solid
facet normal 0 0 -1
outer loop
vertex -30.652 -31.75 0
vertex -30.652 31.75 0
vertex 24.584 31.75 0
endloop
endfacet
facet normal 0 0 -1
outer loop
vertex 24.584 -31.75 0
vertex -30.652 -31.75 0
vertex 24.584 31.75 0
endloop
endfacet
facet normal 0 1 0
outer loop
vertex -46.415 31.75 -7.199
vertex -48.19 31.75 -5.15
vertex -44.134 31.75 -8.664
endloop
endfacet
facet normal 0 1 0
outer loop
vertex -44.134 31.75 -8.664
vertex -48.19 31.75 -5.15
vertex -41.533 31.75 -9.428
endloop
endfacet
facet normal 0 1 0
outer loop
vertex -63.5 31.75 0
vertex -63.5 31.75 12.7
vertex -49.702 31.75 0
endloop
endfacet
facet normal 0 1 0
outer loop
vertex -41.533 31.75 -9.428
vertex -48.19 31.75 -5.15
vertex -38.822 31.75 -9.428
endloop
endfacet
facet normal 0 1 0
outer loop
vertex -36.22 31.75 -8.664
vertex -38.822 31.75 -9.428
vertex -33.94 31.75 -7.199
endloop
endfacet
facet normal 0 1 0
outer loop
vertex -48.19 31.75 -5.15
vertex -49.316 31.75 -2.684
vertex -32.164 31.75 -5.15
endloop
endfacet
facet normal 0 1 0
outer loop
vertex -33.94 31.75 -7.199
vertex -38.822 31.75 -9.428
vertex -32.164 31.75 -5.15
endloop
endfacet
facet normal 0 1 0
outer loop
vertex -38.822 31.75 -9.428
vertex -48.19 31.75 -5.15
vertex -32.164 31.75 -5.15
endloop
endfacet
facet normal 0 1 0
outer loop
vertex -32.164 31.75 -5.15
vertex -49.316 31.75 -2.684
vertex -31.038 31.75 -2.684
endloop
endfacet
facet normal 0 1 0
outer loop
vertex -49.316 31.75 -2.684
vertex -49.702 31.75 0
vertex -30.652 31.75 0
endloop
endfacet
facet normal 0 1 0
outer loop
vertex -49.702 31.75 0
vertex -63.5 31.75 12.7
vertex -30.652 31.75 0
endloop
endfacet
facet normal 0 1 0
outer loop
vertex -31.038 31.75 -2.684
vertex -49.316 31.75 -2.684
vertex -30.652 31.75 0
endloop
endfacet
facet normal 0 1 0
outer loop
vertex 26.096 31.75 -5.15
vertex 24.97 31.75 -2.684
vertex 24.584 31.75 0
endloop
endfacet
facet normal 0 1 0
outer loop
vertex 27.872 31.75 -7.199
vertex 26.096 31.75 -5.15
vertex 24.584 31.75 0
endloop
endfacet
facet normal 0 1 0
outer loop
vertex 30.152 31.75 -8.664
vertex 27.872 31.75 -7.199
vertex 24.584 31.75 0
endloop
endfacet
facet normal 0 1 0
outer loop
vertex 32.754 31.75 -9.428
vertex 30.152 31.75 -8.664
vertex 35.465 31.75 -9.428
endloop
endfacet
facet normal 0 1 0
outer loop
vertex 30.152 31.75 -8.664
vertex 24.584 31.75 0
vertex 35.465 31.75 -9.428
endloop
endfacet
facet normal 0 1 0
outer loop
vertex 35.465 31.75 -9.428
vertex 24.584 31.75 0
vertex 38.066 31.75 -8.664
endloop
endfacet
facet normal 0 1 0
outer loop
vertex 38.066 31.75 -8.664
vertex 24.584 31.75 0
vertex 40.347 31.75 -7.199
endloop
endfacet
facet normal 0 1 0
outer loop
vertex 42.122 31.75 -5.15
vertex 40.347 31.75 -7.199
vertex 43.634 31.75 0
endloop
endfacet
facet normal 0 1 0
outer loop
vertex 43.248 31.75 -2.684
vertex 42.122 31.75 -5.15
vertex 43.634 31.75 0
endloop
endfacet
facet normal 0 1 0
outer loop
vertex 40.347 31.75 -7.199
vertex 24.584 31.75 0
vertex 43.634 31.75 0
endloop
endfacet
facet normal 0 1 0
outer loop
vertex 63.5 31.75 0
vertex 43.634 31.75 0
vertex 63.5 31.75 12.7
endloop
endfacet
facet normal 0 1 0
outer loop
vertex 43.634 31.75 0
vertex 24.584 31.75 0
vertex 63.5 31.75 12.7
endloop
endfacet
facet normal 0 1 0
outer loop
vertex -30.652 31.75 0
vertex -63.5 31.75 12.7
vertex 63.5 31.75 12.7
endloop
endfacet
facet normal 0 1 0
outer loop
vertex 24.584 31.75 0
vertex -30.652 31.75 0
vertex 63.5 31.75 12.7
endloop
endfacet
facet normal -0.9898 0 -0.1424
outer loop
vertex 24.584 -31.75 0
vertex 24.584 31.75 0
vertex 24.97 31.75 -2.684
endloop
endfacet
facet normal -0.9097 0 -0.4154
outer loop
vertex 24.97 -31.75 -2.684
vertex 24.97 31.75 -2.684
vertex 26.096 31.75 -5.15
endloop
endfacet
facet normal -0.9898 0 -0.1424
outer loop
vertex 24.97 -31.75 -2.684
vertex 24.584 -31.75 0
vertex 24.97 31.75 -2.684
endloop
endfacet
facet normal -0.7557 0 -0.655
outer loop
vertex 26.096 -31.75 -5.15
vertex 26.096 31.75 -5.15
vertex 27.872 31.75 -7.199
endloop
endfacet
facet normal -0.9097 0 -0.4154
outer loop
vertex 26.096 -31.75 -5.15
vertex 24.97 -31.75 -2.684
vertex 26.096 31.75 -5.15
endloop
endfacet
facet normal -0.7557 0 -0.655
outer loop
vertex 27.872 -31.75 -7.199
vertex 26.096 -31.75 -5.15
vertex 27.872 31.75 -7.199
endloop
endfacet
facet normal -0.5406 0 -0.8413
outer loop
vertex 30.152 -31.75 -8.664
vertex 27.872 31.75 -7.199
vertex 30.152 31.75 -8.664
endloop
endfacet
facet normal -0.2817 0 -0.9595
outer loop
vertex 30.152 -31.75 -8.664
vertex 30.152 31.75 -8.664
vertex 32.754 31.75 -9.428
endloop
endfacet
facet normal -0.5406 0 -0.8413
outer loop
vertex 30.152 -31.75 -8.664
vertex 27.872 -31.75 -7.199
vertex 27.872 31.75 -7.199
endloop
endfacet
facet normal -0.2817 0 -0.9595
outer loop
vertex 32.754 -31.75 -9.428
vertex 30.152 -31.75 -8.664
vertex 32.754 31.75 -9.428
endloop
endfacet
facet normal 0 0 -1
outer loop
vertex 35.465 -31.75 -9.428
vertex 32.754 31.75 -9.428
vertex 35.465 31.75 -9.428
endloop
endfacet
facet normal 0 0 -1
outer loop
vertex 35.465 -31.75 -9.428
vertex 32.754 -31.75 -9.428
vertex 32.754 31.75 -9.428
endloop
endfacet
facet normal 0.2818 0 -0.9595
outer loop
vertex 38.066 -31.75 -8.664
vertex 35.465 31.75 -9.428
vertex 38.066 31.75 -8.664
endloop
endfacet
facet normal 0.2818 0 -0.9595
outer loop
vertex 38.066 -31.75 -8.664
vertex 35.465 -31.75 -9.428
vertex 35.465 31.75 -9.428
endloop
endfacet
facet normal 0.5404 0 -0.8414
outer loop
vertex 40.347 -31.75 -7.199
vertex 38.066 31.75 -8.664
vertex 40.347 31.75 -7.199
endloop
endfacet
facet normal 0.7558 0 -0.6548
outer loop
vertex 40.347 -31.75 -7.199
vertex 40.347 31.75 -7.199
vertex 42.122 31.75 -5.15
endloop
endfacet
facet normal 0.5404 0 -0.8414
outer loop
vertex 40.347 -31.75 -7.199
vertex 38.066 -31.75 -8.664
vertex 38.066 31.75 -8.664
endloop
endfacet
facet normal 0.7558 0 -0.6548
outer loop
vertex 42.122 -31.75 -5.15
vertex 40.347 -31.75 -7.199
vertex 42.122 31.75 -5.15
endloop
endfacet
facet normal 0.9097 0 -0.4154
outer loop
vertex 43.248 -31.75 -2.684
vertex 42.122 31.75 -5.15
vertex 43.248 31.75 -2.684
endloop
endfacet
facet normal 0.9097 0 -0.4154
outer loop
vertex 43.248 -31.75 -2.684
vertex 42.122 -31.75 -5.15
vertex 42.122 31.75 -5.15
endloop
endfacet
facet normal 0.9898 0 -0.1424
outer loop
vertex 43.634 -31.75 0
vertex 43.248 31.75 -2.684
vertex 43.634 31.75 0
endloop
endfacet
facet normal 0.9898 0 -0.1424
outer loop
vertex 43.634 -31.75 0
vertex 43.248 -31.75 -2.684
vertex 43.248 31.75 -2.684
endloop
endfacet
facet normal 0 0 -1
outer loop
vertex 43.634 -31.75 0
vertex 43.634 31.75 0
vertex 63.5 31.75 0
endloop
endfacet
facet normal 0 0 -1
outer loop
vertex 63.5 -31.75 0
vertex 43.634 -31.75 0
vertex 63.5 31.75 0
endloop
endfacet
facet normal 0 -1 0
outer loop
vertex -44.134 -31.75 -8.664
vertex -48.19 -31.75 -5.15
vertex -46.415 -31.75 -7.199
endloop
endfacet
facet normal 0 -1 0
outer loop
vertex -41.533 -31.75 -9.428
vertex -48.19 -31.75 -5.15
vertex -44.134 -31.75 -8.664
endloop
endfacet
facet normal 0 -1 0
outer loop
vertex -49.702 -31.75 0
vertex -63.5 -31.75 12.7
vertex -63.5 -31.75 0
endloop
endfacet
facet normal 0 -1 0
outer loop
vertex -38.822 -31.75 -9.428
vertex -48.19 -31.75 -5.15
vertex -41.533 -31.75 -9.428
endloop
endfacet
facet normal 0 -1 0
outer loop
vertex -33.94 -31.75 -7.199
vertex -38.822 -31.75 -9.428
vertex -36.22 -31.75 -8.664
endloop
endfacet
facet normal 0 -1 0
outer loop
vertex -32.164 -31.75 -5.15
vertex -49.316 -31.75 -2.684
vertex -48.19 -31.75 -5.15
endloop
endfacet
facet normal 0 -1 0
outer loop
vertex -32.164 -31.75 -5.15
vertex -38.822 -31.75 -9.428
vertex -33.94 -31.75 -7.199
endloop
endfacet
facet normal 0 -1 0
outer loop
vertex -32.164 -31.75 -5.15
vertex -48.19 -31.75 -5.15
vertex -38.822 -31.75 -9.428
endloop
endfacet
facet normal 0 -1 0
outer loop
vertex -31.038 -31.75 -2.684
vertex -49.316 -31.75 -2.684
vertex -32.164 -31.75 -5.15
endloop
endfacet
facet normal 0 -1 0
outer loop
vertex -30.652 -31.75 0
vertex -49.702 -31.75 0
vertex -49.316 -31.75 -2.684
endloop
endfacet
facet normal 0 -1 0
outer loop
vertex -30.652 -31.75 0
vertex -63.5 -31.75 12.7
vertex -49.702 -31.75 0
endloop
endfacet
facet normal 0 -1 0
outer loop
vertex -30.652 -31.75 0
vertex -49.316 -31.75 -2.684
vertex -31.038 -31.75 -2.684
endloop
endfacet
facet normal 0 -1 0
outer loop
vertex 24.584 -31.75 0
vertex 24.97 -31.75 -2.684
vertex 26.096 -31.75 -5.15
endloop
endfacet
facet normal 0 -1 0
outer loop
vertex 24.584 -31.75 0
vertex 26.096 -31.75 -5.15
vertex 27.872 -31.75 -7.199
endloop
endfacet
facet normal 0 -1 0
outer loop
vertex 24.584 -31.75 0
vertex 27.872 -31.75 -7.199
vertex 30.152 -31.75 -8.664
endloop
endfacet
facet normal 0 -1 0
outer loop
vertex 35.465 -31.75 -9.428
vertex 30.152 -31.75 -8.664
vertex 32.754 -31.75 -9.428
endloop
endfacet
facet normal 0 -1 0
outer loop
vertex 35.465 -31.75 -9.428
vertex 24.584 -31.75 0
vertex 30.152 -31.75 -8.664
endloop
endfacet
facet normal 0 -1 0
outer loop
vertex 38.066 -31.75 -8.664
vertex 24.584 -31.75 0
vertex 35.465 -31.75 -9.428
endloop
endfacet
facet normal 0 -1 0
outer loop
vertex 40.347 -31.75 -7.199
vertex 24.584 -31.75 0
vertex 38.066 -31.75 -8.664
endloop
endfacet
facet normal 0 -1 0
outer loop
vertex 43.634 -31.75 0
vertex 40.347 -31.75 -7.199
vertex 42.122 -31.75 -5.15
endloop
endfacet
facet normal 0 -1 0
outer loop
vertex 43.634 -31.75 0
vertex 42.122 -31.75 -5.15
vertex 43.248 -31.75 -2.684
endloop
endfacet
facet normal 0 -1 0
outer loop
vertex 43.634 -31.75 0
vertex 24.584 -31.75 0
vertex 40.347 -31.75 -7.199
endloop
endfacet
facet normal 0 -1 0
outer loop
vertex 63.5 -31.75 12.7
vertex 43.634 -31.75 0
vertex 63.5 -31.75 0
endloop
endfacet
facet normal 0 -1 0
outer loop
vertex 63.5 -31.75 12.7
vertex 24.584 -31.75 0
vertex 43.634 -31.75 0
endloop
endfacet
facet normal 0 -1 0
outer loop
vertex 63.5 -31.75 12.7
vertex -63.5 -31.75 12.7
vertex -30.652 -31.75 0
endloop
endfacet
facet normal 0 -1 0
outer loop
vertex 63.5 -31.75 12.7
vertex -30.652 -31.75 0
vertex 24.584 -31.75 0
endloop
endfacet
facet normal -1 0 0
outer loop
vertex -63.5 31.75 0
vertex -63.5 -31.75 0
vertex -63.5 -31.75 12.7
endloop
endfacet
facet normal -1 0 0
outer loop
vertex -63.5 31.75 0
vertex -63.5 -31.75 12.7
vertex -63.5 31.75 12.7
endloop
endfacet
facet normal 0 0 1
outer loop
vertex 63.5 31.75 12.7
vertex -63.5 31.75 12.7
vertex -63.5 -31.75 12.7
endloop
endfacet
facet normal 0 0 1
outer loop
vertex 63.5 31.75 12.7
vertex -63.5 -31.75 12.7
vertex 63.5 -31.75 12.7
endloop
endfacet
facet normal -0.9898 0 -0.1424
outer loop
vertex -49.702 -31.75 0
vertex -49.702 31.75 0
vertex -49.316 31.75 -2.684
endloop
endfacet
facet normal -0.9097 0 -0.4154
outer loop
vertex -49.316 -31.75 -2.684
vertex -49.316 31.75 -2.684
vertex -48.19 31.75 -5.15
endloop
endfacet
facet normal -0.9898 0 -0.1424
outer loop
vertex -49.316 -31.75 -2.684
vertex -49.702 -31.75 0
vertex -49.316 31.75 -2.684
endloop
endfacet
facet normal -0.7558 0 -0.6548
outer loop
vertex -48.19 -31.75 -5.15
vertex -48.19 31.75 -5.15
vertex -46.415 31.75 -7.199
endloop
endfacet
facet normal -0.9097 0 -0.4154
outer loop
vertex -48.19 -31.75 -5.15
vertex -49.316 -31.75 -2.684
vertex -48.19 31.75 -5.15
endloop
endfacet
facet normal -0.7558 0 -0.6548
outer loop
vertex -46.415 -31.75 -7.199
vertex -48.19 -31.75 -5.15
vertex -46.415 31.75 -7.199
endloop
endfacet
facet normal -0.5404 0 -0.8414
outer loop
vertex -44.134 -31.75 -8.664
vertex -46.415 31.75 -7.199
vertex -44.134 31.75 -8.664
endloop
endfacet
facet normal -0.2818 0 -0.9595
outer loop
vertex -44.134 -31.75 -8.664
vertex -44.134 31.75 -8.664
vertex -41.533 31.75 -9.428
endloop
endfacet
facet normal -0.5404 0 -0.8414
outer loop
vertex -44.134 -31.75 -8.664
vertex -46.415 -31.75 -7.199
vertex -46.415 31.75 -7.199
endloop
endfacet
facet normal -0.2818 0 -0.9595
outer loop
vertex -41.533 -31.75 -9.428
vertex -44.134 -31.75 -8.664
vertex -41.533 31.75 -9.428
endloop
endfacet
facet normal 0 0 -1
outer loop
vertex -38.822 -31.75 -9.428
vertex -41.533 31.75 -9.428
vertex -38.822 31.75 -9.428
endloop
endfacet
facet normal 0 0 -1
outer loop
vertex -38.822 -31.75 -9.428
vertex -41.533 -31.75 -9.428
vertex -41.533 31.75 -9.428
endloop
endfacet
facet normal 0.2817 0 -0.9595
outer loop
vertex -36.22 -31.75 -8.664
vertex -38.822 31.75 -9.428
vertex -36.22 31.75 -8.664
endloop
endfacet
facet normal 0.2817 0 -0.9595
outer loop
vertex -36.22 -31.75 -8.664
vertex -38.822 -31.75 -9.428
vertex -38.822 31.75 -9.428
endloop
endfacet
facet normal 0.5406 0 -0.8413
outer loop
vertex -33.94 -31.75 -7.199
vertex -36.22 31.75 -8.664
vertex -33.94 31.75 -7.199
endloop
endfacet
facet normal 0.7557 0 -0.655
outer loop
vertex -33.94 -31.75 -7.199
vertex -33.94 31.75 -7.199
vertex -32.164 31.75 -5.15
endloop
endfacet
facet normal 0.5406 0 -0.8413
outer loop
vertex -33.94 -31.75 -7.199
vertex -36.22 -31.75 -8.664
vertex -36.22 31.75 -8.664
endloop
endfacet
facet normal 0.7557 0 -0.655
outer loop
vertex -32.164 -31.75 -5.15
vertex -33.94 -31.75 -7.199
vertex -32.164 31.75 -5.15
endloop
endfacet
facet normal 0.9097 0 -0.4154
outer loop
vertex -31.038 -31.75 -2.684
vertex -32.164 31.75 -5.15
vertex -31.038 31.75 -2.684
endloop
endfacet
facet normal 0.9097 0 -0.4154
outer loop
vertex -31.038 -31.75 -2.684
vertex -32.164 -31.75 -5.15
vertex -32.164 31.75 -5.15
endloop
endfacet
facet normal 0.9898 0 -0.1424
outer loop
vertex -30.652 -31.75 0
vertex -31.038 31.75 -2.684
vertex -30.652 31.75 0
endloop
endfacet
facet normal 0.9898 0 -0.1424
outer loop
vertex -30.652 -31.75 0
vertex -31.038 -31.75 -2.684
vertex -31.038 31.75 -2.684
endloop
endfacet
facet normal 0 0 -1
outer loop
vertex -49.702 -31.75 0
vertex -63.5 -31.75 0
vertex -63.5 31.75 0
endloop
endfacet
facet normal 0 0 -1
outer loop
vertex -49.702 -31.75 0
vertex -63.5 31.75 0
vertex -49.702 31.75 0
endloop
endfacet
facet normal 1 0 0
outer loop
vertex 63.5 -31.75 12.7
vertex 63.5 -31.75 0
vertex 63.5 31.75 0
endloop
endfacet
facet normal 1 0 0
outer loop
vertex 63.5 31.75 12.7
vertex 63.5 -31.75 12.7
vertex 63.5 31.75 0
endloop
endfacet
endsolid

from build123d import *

# Parameters (mm, degrees)
F0_W     = 127
F0_H     = 63.5
F1_DEPTH = 12.7
F4_DEPTH = 63.5


with BuildPart() as f1:
    # F0 (on Top) → F1 (new body)
    with BuildSketch(Plane.XY):
        Rectangle(F0_W, F0_H)
    extrude(amount=F1_DEPTH)

    # F2 (on face) + F3 (on face) → F4 (join)
    with BuildSketch(Plane.XZ.offset(31.75)):
        with BuildLine():
            ThreePointArc((-49.7021888137, 0), (-40.1771888137, -9.525), (-30.6521888137, 0))
            Line((-30.6521888137, 0), (-49.7021888137, 0))
        make_face()
    with BuildSketch(Plane.XZ.offset(31.75)):
        with BuildLine():
            Line((24.5841778814, 0), (43.6341778814, 0))
            ThreePointArc((43.6341778814, 0), (34.1091778814, 9.525), (24.5841778814, 0))
        make_face()
        with BuildLine():
            ThreePointArc((24.5841778814, 0), (34.1091778814, -9.525), (43.6341778814, 0))
            Line((43.6341778814, 0), (24.5841778814, 0))
        make_face()
    extrude(amount=-F4_DEPTH)


solid = f1.part
